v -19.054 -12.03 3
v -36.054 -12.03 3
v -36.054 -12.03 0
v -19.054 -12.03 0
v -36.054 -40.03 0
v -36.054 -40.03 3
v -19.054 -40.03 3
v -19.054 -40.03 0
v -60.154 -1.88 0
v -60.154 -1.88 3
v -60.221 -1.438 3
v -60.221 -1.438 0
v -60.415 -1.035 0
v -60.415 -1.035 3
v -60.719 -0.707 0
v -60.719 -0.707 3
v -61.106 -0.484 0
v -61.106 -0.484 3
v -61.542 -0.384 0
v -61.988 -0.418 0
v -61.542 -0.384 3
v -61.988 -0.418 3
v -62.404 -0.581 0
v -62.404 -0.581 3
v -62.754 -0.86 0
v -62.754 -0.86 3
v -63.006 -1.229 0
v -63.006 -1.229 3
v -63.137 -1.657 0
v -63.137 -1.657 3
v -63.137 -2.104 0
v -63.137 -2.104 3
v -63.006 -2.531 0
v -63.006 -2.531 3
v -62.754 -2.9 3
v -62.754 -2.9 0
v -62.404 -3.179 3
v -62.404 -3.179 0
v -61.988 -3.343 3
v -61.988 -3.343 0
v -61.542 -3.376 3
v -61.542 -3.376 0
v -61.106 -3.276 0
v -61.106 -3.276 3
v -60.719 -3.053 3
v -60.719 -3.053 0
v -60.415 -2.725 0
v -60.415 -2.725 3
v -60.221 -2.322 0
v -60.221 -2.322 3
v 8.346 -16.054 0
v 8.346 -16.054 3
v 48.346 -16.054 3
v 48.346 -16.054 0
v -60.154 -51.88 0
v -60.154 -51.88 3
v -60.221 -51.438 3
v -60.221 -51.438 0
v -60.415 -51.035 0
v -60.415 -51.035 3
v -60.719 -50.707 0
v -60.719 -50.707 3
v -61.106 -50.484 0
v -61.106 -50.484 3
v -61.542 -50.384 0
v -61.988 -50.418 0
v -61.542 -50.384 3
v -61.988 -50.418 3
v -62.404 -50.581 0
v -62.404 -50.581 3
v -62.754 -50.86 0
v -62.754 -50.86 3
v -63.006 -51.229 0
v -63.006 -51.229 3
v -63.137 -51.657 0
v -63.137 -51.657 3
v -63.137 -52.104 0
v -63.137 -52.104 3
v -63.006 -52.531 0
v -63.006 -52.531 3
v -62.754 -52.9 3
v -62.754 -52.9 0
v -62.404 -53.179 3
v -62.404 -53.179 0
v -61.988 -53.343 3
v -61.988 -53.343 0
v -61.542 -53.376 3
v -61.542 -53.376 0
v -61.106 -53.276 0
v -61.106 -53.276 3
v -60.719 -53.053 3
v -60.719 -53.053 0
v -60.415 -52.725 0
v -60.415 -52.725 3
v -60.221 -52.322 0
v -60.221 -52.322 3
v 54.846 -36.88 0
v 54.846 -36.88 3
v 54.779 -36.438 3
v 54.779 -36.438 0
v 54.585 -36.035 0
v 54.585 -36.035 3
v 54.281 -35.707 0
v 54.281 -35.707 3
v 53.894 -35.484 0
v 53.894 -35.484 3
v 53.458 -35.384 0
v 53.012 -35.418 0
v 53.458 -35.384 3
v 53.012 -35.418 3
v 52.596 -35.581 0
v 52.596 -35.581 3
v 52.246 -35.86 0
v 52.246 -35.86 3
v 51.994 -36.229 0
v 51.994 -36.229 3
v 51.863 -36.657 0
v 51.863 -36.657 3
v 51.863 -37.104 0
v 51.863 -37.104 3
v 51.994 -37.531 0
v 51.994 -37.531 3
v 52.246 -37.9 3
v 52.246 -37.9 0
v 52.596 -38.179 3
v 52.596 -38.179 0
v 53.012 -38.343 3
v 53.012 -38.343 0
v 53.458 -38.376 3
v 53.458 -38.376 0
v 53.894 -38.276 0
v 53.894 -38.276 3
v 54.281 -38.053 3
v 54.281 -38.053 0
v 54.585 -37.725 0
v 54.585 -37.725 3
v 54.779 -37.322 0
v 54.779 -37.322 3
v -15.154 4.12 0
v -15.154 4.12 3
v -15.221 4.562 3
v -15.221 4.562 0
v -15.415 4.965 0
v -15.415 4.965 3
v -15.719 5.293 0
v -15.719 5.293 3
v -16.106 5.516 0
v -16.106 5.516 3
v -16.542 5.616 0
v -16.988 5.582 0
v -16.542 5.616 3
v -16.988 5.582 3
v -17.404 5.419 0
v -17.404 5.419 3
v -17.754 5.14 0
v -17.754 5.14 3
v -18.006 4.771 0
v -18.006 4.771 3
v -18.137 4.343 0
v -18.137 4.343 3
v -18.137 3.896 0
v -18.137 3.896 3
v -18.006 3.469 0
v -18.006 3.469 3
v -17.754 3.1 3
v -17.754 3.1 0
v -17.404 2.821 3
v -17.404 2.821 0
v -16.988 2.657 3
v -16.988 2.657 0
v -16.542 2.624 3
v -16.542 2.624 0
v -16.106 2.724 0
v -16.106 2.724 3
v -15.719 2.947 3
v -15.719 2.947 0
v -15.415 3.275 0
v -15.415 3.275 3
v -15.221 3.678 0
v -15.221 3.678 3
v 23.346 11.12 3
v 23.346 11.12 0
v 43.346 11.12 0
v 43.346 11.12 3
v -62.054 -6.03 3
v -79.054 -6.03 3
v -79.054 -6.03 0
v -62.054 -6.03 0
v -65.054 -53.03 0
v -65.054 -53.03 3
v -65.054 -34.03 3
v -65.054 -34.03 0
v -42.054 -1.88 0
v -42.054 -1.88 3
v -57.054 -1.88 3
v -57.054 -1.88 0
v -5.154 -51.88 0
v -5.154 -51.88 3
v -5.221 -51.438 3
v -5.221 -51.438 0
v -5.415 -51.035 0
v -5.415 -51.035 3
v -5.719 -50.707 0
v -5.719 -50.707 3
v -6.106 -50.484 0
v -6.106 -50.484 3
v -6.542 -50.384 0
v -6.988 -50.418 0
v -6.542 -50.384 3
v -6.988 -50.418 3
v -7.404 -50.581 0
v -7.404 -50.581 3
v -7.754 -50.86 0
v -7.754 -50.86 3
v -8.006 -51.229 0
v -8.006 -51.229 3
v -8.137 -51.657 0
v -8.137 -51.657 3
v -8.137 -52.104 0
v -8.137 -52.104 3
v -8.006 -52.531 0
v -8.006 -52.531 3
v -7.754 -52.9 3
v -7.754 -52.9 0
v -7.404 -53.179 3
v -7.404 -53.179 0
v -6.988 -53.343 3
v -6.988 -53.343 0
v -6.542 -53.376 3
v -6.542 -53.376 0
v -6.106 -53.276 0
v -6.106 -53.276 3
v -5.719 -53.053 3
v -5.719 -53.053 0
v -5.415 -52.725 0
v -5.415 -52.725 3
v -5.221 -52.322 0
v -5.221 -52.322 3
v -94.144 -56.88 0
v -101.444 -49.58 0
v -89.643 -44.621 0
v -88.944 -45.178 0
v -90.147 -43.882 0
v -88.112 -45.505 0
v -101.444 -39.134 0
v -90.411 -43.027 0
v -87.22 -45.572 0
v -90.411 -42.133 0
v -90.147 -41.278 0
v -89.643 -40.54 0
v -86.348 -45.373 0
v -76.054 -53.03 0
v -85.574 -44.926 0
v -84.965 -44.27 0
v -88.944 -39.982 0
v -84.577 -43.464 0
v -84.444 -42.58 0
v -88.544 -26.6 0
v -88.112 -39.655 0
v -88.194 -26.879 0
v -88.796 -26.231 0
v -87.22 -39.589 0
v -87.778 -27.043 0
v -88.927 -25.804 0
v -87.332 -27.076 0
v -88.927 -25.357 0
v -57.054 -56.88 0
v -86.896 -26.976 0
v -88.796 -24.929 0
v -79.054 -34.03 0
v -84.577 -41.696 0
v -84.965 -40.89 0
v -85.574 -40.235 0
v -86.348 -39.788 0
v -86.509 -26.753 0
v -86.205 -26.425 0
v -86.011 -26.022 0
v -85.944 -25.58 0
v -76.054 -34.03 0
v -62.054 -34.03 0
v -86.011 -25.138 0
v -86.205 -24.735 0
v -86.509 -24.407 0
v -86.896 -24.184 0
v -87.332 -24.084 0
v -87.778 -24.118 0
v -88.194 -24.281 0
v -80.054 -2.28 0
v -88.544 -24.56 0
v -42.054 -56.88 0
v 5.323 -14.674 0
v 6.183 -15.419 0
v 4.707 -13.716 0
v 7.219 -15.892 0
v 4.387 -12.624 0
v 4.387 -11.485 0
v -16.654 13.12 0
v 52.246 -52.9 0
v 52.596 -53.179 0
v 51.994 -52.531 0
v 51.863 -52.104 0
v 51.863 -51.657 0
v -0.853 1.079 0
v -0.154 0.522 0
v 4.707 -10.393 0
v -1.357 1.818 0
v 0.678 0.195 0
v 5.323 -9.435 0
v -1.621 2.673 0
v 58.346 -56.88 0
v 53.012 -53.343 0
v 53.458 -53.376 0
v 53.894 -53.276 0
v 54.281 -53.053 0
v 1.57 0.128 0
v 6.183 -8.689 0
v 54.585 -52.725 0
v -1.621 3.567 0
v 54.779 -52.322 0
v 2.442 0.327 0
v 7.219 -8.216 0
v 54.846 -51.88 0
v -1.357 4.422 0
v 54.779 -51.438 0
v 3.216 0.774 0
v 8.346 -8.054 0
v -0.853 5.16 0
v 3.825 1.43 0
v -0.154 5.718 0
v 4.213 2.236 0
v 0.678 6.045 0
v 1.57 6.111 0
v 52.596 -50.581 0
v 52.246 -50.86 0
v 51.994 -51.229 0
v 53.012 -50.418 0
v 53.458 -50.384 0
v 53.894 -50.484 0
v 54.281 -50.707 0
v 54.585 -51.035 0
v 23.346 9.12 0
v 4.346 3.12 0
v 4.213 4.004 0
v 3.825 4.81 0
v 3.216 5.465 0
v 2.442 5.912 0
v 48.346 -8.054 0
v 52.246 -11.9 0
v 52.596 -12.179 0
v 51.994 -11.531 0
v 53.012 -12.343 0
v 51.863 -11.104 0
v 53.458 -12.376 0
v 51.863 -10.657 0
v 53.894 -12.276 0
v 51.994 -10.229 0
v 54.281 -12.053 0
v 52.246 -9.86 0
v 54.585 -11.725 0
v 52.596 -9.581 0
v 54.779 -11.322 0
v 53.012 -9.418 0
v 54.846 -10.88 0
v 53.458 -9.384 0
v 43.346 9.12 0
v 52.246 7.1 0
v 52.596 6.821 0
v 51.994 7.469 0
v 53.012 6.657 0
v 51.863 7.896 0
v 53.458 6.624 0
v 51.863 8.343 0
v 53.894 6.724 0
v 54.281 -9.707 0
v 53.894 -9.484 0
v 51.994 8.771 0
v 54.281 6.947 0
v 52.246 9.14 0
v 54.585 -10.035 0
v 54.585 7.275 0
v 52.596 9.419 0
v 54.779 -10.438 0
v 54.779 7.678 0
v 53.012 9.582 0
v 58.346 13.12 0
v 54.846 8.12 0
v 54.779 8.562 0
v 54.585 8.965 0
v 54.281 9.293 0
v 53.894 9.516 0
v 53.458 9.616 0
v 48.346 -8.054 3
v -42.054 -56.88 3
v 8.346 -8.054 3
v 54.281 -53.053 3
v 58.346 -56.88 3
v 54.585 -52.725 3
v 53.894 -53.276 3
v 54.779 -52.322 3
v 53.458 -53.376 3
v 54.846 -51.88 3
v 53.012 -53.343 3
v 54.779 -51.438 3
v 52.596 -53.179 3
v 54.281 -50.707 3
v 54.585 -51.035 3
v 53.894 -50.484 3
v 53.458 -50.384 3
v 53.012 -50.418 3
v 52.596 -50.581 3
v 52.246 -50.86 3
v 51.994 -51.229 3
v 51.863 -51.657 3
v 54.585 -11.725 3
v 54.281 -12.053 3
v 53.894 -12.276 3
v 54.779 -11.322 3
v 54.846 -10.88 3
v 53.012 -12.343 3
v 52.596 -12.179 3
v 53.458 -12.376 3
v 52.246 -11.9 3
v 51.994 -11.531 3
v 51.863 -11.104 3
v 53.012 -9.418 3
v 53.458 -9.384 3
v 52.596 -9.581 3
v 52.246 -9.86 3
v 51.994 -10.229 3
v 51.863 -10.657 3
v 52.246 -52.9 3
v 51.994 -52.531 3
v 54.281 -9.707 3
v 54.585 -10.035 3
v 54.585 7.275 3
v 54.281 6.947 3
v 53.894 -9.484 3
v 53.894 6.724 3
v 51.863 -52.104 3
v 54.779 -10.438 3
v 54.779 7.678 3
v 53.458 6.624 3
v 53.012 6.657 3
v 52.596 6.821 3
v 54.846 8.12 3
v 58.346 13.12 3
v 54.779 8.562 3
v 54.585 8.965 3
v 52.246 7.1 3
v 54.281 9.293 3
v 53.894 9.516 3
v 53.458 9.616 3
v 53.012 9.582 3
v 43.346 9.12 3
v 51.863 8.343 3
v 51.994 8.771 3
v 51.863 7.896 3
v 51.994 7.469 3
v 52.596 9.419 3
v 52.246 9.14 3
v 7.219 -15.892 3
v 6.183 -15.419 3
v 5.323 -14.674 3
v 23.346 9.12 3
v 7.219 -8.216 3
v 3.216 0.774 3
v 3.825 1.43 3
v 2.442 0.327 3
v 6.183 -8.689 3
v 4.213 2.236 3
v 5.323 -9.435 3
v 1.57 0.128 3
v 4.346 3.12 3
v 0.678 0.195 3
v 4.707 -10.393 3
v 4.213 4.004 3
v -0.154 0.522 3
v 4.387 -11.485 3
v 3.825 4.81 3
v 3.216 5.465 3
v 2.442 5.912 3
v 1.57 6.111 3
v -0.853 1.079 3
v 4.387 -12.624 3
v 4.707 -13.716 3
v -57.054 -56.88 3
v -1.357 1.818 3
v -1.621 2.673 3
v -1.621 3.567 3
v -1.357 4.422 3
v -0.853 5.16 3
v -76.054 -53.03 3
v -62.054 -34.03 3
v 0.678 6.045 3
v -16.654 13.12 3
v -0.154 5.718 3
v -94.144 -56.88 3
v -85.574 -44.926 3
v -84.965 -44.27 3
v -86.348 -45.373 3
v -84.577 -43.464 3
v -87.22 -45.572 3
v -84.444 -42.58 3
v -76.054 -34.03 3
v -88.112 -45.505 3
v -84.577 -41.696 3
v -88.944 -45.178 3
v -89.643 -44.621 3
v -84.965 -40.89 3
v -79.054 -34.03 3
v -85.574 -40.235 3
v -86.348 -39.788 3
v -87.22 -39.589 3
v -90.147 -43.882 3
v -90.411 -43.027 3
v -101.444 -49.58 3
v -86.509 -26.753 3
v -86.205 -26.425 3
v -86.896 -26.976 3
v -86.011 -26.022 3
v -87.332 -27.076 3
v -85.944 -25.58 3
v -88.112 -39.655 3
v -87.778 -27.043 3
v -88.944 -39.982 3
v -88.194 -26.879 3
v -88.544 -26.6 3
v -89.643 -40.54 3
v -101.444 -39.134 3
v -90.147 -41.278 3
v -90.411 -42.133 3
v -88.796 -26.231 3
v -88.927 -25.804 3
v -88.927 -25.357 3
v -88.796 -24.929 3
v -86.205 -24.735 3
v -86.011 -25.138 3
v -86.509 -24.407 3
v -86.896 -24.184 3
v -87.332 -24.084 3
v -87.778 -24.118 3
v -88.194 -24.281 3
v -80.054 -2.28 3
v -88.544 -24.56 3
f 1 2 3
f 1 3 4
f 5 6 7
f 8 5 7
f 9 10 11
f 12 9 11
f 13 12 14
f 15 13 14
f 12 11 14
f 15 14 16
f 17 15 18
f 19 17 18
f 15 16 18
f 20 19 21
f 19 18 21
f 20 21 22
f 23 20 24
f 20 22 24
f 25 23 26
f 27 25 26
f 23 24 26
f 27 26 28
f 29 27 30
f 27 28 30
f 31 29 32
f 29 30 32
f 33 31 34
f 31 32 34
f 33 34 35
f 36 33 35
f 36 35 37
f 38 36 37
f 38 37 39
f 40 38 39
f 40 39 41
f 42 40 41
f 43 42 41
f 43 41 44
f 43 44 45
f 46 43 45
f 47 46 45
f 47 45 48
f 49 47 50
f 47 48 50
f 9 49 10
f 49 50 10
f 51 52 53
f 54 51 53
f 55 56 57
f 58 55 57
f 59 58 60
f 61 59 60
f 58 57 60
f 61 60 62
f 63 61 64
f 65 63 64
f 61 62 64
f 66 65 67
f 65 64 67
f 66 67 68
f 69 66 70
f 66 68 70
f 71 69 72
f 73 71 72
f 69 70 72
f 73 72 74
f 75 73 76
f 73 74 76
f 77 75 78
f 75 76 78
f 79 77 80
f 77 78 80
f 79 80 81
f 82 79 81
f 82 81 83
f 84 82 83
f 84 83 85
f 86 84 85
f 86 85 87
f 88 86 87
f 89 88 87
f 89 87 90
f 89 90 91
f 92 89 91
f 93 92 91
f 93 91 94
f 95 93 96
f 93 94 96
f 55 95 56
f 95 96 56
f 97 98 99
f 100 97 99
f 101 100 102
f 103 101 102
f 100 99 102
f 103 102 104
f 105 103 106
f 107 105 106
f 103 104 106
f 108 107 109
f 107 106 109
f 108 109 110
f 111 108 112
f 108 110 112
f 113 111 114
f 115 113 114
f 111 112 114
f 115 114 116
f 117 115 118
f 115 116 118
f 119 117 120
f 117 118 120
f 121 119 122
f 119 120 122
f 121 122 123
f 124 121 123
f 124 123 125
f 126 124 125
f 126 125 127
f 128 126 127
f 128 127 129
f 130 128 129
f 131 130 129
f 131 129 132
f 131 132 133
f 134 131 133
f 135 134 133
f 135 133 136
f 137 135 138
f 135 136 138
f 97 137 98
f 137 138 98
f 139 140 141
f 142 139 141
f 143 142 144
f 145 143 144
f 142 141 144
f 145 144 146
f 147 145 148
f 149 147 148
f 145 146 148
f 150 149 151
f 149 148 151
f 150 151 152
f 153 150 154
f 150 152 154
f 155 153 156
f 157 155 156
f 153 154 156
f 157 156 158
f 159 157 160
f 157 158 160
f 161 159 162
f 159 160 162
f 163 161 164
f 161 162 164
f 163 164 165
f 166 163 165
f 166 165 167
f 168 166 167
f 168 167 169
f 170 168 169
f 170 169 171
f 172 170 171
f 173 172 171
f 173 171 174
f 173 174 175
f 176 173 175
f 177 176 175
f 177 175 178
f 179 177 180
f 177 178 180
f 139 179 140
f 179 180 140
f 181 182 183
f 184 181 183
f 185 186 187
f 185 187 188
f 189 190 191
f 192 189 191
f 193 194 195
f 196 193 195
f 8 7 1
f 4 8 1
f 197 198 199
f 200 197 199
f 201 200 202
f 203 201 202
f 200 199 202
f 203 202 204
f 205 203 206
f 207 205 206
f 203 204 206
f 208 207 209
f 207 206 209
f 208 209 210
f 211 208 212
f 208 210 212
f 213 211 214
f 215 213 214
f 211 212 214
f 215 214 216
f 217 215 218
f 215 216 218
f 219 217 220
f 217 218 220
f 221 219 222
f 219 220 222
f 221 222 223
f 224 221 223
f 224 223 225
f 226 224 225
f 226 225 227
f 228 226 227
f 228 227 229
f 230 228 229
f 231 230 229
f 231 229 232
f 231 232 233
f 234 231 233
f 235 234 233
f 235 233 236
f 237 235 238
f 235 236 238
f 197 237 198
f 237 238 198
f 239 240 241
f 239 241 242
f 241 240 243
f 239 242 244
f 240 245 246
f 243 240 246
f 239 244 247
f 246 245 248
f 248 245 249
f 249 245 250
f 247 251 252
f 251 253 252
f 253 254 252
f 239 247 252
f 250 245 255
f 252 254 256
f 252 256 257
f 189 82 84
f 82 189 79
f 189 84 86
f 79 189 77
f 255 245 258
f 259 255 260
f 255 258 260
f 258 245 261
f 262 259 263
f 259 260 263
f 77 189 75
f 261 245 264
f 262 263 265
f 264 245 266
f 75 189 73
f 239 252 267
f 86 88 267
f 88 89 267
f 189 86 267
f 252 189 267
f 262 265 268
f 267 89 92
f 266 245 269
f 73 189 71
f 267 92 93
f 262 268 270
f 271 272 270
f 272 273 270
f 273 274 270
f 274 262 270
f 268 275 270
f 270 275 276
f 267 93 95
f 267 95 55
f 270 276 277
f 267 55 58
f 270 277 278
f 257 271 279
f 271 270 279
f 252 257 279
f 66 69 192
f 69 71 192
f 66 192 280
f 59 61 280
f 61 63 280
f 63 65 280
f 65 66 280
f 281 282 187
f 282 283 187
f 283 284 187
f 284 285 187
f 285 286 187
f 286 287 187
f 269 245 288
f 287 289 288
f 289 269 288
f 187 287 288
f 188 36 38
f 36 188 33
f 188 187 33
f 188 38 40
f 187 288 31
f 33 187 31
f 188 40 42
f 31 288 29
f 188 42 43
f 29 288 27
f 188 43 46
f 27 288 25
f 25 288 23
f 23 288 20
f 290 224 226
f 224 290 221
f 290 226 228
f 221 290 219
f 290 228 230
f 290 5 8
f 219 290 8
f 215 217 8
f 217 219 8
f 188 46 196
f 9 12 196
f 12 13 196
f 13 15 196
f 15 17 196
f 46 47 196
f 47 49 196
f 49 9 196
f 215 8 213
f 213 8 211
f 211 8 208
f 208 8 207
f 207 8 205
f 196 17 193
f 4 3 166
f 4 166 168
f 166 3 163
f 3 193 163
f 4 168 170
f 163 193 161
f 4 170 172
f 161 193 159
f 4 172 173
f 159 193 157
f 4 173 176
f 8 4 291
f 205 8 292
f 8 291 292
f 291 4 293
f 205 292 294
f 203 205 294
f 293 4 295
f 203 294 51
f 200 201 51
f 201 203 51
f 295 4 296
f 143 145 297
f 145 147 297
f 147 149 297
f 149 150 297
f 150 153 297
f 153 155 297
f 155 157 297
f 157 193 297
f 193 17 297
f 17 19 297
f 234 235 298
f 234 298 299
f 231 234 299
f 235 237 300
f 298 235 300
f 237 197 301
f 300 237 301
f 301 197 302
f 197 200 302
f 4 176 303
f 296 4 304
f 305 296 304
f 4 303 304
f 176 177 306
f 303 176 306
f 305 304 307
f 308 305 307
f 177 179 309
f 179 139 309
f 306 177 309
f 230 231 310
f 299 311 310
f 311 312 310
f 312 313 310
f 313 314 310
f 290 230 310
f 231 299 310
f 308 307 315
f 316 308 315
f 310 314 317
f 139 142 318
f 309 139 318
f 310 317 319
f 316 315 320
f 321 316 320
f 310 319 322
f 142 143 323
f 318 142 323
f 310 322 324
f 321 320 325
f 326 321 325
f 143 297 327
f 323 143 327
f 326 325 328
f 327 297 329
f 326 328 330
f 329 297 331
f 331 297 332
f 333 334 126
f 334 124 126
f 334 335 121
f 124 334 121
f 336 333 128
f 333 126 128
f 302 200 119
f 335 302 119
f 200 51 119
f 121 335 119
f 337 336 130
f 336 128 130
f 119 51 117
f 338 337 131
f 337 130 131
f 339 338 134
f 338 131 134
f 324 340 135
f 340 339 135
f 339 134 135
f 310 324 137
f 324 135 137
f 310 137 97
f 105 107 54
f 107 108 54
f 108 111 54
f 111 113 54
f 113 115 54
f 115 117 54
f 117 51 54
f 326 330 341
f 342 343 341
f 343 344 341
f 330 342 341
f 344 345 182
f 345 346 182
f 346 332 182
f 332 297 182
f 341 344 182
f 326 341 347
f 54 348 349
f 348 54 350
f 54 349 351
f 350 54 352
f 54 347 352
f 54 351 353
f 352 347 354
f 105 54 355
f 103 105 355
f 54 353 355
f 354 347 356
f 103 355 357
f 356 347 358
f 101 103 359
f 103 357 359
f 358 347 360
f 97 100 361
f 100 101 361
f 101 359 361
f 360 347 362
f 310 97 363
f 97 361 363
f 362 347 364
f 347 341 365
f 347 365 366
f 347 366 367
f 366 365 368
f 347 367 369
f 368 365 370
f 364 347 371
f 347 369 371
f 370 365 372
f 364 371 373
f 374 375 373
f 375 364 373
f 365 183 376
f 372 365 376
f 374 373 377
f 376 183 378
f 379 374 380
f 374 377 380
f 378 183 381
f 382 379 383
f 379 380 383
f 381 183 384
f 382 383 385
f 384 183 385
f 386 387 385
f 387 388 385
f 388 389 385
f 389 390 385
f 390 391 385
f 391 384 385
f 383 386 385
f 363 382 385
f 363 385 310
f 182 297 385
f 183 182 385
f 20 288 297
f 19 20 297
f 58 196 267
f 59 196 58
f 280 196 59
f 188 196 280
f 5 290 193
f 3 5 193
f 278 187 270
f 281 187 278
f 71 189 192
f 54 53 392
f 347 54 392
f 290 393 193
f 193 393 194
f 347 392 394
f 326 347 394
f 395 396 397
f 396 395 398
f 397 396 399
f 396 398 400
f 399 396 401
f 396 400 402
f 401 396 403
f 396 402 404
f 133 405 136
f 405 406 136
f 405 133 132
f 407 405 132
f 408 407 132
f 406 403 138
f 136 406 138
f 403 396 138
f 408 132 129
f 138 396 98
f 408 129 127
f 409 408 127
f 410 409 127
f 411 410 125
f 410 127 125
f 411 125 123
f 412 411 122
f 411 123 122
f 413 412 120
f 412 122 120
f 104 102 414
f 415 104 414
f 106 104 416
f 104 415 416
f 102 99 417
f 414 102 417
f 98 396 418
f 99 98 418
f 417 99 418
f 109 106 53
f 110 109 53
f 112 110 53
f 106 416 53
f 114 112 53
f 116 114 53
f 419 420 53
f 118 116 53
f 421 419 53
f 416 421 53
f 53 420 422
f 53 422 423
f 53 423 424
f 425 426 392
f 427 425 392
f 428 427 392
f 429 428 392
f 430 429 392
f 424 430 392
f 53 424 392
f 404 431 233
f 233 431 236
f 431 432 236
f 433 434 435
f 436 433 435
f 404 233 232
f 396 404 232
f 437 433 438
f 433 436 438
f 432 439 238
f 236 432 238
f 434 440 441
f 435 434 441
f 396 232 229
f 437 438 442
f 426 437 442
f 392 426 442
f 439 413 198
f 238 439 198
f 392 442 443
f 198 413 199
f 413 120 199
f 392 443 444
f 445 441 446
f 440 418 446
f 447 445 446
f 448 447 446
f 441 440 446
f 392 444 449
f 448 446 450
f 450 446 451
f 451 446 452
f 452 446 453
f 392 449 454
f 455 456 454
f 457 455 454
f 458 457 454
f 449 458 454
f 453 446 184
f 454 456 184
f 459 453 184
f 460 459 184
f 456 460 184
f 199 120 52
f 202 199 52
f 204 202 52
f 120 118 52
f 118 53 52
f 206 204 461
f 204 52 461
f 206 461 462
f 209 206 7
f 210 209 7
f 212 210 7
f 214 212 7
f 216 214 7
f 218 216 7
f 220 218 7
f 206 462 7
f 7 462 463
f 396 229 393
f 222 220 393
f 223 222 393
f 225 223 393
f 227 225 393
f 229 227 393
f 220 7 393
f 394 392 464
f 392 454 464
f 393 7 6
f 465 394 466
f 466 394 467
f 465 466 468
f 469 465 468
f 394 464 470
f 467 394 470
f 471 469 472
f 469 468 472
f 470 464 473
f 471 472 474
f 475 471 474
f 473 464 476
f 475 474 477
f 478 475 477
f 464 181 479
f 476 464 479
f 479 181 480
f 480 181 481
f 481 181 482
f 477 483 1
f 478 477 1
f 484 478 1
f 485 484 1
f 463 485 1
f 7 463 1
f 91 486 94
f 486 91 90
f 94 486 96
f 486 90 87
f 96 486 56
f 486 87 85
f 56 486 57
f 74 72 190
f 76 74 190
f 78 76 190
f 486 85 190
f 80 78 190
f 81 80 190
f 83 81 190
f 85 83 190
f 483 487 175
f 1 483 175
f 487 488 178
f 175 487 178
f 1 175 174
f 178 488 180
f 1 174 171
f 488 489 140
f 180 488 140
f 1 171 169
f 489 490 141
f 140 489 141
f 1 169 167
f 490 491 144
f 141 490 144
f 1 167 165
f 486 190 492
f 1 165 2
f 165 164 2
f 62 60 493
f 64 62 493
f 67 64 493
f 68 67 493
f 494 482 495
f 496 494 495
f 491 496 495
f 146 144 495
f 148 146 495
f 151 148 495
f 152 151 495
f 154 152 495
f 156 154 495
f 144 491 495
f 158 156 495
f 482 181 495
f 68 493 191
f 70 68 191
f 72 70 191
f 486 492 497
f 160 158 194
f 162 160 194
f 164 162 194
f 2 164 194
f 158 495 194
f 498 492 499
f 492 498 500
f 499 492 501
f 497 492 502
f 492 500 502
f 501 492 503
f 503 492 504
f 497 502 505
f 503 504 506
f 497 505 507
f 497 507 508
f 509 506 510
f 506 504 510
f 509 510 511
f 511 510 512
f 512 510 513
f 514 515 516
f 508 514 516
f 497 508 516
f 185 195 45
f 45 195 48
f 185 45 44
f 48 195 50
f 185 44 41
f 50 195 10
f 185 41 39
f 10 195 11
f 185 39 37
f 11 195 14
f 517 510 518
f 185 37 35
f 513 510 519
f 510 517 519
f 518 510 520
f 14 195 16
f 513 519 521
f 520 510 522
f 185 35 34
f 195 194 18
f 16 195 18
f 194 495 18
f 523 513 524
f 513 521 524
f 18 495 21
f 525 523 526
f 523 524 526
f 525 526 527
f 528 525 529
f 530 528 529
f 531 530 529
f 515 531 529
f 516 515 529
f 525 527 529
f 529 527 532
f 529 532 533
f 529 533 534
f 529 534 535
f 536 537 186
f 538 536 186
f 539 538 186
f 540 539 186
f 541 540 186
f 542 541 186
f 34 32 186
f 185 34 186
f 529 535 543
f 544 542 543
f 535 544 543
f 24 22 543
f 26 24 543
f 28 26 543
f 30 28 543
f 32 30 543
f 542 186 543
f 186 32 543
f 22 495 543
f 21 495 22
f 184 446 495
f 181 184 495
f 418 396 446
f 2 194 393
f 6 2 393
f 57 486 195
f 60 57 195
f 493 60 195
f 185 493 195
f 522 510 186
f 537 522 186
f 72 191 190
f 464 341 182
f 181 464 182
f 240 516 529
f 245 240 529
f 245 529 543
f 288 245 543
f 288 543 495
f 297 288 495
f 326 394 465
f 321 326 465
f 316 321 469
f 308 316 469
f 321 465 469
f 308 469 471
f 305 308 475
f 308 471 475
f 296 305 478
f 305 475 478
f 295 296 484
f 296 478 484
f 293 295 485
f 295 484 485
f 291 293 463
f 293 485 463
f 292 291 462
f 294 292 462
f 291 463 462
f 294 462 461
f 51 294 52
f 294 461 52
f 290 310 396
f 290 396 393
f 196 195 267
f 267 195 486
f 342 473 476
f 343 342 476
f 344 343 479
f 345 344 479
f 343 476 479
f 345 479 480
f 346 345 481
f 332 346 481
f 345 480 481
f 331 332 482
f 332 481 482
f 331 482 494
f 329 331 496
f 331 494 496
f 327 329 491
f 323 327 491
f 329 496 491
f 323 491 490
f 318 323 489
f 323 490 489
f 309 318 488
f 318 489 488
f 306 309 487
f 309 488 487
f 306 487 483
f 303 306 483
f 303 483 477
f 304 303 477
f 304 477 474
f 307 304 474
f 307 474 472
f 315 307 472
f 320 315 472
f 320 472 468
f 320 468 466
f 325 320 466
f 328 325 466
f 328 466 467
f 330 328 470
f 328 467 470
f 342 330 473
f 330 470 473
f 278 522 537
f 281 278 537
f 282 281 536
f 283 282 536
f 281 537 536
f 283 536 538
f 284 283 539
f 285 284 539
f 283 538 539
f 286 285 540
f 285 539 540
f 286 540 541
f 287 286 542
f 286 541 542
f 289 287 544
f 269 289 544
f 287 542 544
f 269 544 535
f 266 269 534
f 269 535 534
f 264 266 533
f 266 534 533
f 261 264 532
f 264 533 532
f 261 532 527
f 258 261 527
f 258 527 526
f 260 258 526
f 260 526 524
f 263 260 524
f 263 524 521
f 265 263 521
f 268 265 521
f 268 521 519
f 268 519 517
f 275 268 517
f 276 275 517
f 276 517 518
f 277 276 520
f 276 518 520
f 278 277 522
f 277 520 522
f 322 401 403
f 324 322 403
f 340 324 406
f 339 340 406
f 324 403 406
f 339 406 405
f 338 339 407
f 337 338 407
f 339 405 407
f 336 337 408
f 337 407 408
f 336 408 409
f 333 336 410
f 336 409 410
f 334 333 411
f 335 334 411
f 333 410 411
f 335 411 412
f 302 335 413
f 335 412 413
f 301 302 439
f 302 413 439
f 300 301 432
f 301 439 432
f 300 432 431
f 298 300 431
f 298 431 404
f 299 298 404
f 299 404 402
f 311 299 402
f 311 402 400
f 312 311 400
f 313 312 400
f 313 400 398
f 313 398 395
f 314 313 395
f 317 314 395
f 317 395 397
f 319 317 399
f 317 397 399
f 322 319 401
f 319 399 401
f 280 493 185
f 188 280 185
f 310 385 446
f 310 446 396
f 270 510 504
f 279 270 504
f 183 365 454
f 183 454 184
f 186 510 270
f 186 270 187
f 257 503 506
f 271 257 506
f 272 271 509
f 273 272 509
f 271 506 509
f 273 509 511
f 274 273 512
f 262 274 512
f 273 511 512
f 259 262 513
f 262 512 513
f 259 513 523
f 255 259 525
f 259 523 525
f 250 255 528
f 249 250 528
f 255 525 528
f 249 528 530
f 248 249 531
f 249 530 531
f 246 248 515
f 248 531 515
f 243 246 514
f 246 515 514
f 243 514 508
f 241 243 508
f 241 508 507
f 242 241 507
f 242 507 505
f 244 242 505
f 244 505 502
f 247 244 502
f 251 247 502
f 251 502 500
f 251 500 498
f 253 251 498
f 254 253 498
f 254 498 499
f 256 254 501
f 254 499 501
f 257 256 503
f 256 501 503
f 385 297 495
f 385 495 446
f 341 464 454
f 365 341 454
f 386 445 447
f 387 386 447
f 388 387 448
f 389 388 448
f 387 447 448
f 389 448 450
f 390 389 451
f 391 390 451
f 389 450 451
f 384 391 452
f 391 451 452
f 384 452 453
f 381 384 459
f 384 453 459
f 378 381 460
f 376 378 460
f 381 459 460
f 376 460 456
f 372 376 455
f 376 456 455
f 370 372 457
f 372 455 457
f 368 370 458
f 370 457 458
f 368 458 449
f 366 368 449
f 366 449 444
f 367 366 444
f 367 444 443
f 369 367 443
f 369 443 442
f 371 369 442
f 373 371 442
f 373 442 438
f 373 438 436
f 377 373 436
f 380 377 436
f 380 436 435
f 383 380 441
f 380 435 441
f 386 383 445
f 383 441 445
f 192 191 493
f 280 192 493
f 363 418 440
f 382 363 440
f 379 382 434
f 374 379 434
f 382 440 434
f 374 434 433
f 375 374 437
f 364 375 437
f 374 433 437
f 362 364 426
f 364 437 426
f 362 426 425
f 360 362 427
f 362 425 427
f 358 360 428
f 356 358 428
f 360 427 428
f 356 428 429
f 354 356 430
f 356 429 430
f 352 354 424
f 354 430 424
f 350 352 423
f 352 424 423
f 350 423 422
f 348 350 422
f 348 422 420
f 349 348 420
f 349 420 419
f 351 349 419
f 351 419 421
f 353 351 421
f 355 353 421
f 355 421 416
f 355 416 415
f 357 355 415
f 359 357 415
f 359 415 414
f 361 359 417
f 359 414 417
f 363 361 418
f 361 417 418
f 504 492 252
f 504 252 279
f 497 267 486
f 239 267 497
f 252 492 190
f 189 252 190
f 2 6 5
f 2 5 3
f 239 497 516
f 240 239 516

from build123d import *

# Parameters (mm, degrees)
SKETCH1_R           = 1.25
SKETCH1_R_2         = 0.75
SKETCH1_W           = 60
SKETCH1_H           = 20
SKETCH1_W_2         = 5
SKETCH1_H_2         = 1
BOSS_EXTRUDE2_DEPTH = 3
SKETCH3_R           = 1.25
CUT_EXTRUDE2_DEPTH  = 3
BOSS_EXTRUDE4_START = -3
SKETCH15_R          = 0.75
BOSS_EXTRUDE4_DEPTH = 3
SKETCH23_R          = 0.75
CUT_EXTRUDE21_DEPTH = 10
SKETCH24_R          = 0.75
CUT_EXTRUDE22_DEPTH = 10
CUT_EXTRUDE23_DEPTH = 10
SKETCH28_W          = 17
SKETCH28_H          = 28
CUT_EXTRUDE25_DEPTH = 3
SKETCH30_R          = 3
CUT_EXTRUDE26_DEPTH = 3
CUT_EXTRUDE28_DEPTH = 3
SKETCH32_R          = 3
CUT_EXTRUDE29_DEPTH = 3
SKETCH33_W          = 10
SKETCH33_H          = 1
CUT_EXTRUDE30_DEPTH = 3
CUT_EXTRUDE32_DEPTH = 3
SKETCH36_R          = 1.5
CUT_EXTRUDE33_DEPTH = 3
SKETCH37_R          = 1.5
CUT_EXTRUDE34_DEPTH = 3
CUT_EXTRUDE36_DEPTH = 3
BOSS_EXTRUDE5_START = -3
SKETCH40_R          = 1.25
BOSS_EXTRUDE5_DEPTH = 3
BOSS_EXTRUDE6_START = -3
SKETCH41_R          = 1.25
BOSS_EXTRUDE6_DEPTH = 3
SKETCH42_R          = 1.5
CUT_EXTRUDE37_DEPTH = 3
SKETCH43_R          = 1.5
CUT_EXTRUDE38_DEPTH = 3
SKETCH44_R          = 1.5
CUT_EXTRUDE39_DEPTH = 3
SKETCH45_R          = 1.5
CUT_EXTRUDE40_DEPTH = 3
SKETCH46_R          = 1.5
CUT_EXTRUDE41_DEPTH = 3
SKETCH47_W          = 20
SKETCH47_H          = 1
CUT_EXTRUDE42_DEPTH = 3
SKETCH48_W          = 11
SKETCH48_H          = 19
CUT_EXTRUDE44_DEPTH = 10


with BuildPart() as part:
    # Sketch1 → Boss-Extrude2 (new body)
    with BuildSketch(Plane.XY):
        Polygon((58.345821786, 13.119852123), (58.345821786, -56.880147877), (-191.654178214, -56.880147877), (-191.654178214, -26.880147877), (-221.654178214, -6.880147877), (-221.654178214, 33.119852123), (-121.654178214, 33.119852123), (-91.654178214, 13.119852123), align=None)
        with Locations((53.345821786, 7.945541925)):
            Circle(SKETCH1_R, mode=Mode.SUBTRACT)
        with Locations((53.345821786, -52.054458075)):
            Circle(SKETCH1_R, mode=Mode.SUBTRACT)
        with Locations((25.505821786, -18.330147877)):
            Circle(SKETCH1_R_2, mode=Mode.SUBTRACT)
        with Locations((-181.654178214, 13.119852123)):
            Rectangle(SKETCH1_W, SKETCH1_H, mode=Mode.SUBTRACT)
        with Locations((25.845821786, 10.619852123)):
            Rectangle(SKETCH1_W_2, SKETCH1_H_2, mode=Mode.SUBTRACT)
        with Locations((40.845821786, 10.619852123)):
            Rectangle(SKETCH1_W_2, SKETCH1_H_2, mode=Mode.SUBTRACT)
    extrude(amount=BOSS_EXTRUDE2_DEPTH)

    # Sketch3 → Cut-Extrude2 (cut)
    with BuildSketch(Plane.XY.offset(3)):
        with Locations((1.345821786, 3.119852123)):
            Circle(SKETCH3_R)
    extrude(amount=-CUT_EXTRUDE2_DEPTH, mode=Mode.SUBTRACT)

    # Sketch15 → Boss-Extrude4 (add)
    with BuildSketch(Plane.XY.offset(3).offset(BOSS_EXTRUDE4_START)):
        with Locations((25.505821786, -18.330147877)):
            Circle(SKETCH15_R)
    extrude(amount=BOSS_EXTRUDE4_DEPTH)

    # Sketch23 → Cut-Extrude21 (cut)
    with BuildSketch(Plane.XY.offset(3)):
        with Locations((-93.524701832, -7.521447448)):
            Circle(SKETCH23_R)
    extrude(amount=-CUT_EXTRUDE21_DEPTH, mode=Mode.SUBTRACT)

    # Sketch24 → Cut-Extrude22 (cut)
    with BuildSketch(Plane.XY.offset(3)):
        with Locations((-107.363654596, -9.638848305)):
            Circle(SKETCH24_R)
    extrude(amount=-CUT_EXTRUDE22_DEPTH, mode=Mode.SUBTRACT)

    # Sketch26 → Cut-Extrude23 (cut)
    with BuildSketch(Plane.XY.offset(3)):
        Polygon((-103.444178214, -47.580147877), (-103.444178214, -42.580147877), (-80.054178214, -2.280147877), (-16.654178214, 13.119852123), (-91.654178214, 13.119852123), (-121.654178214, 33.119852123), (-221.654178214, 33.119852123), (-221.654178214, -6.880147877), (-191.654178214, -26.880147877), (-191.654178214, -56.880147877), (-94.144178214, -56.880147877), align=None)
    extrude(amount=-CUT_EXTRUDE23_DEPTH, mode=Mode.SUBTRACT)

    # Sketch28 → Cut-Extrude25 (cut)
    with BuildSketch(Plane.XY.offset(3)):
        with Locations((-27.554178214, -26.030147877)):
            Rectangle(SKETCH28_W, SKETCH28_H)
        with Locations((-70.554178214, -20.030147877)):
            Rectangle(SKETCH28_W, SKETCH28_H)
    extrude(amount=-CUT_EXTRUDE25_DEPTH, mode=Mode.SUBTRACT)

    # Sketch30 → Cut-Extrude26 (cut)
    with BuildSketch(Plane.XY.offset(3)):
        with Locations((-87.444178214, -42.580147877)):
            Circle(SKETCH30_R)
    extrude(amount=-CUT_EXTRUDE26_DEPTH, mode=Mode.SUBTRACT)

    # Sketch31 → Cut-Extrude28 (cut)
    with BuildSketch(Plane.XY.offset(3)):
        with BuildLine():
            Line((48.345821786, -11.054458075), (48.345821786, -8.054458075))
            Line((48.345821786, -8.054458075), (8.345821786, -8.054458075))
            ThreePointArc((8.345821786, -8.054458075), (4.345821786, -12.054458075), (8.345821786, -16.054458075))
            Line((8.345821786, -16.054458075), (48.345821786, -16.054458075))
            Line((48.345821786, -16.054458075), (48.345821786, -11.054458075))
        make_face()
    extrude(amount=-CUT_EXTRUDE28_DEPTH, mode=Mode.SUBTRACT)

    # Sketch32 → Cut-Extrude29 (cut)
    with BuildSketch(Plane.XY.offset(3)):
        with Locations((1.345821786, 3.119852123)):
            Circle(SKETCH32_R)
    extrude(amount=-CUT_EXTRUDE29_DEPTH, mode=Mode.SUBTRACT)

    # Sketch33 → Cut-Extrude30 (cut)
    with BuildSketch(Plane.XY.offset(3)):
        with Locations((33.345821786, 10.619852123)):
            Rectangle(SKETCH33_W, SKETCH33_H)
    extrude(amount=-CUT_EXTRUDE30_DEPTH, mode=Mode.SUBTRACT)

    # Sketch35 → Cut-Extrude32 (cut)
    with BuildSketch(Plane.XY.offset(3)):
        Polygon((-101.444178214, -45.080147877), (-101.444178214, -39.134230818), (-103.444178214, -42.580147877), (-103.444178214, -47.580147877), (-101.444178214, -49.580147877), align=None)
    extrude(amount=-CUT_EXTRUDE32_DEPTH, mode=Mode.SUBTRACT)

    # Sketch36 → Cut-Extrude33 (cut)
    with BuildSketch(Plane.XY.offset(3)):
        with Locations((-61.654178214, -1.880147877)):
            Circle(SKETCH36_R)
    extrude(amount=-CUT_EXTRUDE33_DEPTH, mode=Mode.SUBTRACT)

    # Sketch37 → Cut-Extrude34 (cut)
    with BuildSketch(Plane.XY.offset(3)):
        with Locations((-87.444178214, -25.580147877)):
            Circle(SKETCH37_R)
    extrude(amount=-CUT_EXTRUDE34_DEPTH, mode=Mode.SUBTRACT)

    # Sketch39 → Cut-Extrude36 (cut)
    with BuildSketch(Plane.XY.offset(3)):
        Polygon((-57.054178214, -20.030147877), (-57.054178214, -56.880147877), (-42.054178214, -56.880147877), (-42.054178214, -1.880147877), (-57.054178214, -1.880147877), align=None)
    extrude(amount=-CUT_EXTRUDE36_DEPTH, mode=Mode.SUBTRACT)

    # Sketch40 → Boss-Extrude5 (add)
    with BuildSketch(Plane.XY.offset(3).offset(BOSS_EXTRUDE5_START)):
        with Locations((53.345821786, 7.945541925)):
            Circle(SKETCH40_R)
    extrude(amount=BOSS_EXTRUDE5_DEPTH)

    # Sketch41 → Boss-Extrude6 (add)
    with BuildSketch(Plane.XY.offset(3).offset(BOSS_EXTRUDE6_START)):
        with Locations((53.345821786, -52.054458075)):
            Circle(SKETCH41_R)
    extrude(amount=BOSS_EXTRUDE6_DEPTH)

    # Sketch42 → Cut-Extrude37 (cut)
    with BuildSketch(Plane.XY.offset(3)):
        with Locations((53.345821786, -51.880147877)):
            Circle(SKETCH42_R)
    extrude(amount=-CUT_EXTRUDE37_DEPTH, mode=Mode.SUBTRACT)

    # Sketch43 → Cut-Extrude38 (cut)
    with BuildSketch(Plane.XY.offset(3)):
        with Locations((-6.654178214, -51.880147877)):
            Circle(SKETCH43_R)
    extrude(amount=-CUT_EXTRUDE38_DEPTH, mode=Mode.SUBTRACT)

    # Sketch44 → Cut-Extrude39 (cut)
    with BuildSketch(Plane.XY.offset(3)):
        with Locations((-61.654178214, -51.880147877)):
            Circle(SKETCH44_R)
    extrude(amount=-CUT_EXTRUDE39_DEPTH, mode=Mode.SUBTRACT)

    # Sketch45 → Cut-Extrude40 (cut)
    with BuildSketch(Plane.XY.offset(3)):
        with Locations((53.345821786, 8.119852123)):
            Circle(SKETCH45_R)
        with Locations((53.345821786, -10.880147877)):
            Circle(SKETCH45_R)
        with Locations((53.345821786, -36.880147877)):
            Circle(SKETCH45_R)
    extrude(amount=-CUT_EXTRUDE40_DEPTH, mode=Mode.SUBTRACT)

    # Sketch46 → Cut-Extrude41 (cut)
    with BuildSketch(Plane.XY.offset(3)):
        with Locations((-16.654178214, 4.119852123)):
            Circle(SKETCH46_R)
    extrude(amount=-CUT_EXTRUDE41_DEPTH, mode=Mode.SUBTRACT)

    # Sketch47 → Cut-Extrude42 (cut)
    with BuildSketch(Plane.XY.offset(3)):
        with Locations((33.345821786, 9.619852123)):
            Rectangle(SKETCH47_W, SKETCH47_H)
    extrude(amount=-CUT_EXTRUDE42_DEPTH, mode=Mode.SUBTRACT)

    # Sketch48 → Cut-Extrude44 (cut)
    with BuildSketch(Plane.XY.offset(3)):
        with Locations((-70.554178214, -43.530147877)):
            Rectangle(SKETCH48_W, SKETCH48_H)
    extrude(amount=-CUT_EXTRUDE44_DEPTH, mode=Mode.SUBTRACT)


solid = part.part
